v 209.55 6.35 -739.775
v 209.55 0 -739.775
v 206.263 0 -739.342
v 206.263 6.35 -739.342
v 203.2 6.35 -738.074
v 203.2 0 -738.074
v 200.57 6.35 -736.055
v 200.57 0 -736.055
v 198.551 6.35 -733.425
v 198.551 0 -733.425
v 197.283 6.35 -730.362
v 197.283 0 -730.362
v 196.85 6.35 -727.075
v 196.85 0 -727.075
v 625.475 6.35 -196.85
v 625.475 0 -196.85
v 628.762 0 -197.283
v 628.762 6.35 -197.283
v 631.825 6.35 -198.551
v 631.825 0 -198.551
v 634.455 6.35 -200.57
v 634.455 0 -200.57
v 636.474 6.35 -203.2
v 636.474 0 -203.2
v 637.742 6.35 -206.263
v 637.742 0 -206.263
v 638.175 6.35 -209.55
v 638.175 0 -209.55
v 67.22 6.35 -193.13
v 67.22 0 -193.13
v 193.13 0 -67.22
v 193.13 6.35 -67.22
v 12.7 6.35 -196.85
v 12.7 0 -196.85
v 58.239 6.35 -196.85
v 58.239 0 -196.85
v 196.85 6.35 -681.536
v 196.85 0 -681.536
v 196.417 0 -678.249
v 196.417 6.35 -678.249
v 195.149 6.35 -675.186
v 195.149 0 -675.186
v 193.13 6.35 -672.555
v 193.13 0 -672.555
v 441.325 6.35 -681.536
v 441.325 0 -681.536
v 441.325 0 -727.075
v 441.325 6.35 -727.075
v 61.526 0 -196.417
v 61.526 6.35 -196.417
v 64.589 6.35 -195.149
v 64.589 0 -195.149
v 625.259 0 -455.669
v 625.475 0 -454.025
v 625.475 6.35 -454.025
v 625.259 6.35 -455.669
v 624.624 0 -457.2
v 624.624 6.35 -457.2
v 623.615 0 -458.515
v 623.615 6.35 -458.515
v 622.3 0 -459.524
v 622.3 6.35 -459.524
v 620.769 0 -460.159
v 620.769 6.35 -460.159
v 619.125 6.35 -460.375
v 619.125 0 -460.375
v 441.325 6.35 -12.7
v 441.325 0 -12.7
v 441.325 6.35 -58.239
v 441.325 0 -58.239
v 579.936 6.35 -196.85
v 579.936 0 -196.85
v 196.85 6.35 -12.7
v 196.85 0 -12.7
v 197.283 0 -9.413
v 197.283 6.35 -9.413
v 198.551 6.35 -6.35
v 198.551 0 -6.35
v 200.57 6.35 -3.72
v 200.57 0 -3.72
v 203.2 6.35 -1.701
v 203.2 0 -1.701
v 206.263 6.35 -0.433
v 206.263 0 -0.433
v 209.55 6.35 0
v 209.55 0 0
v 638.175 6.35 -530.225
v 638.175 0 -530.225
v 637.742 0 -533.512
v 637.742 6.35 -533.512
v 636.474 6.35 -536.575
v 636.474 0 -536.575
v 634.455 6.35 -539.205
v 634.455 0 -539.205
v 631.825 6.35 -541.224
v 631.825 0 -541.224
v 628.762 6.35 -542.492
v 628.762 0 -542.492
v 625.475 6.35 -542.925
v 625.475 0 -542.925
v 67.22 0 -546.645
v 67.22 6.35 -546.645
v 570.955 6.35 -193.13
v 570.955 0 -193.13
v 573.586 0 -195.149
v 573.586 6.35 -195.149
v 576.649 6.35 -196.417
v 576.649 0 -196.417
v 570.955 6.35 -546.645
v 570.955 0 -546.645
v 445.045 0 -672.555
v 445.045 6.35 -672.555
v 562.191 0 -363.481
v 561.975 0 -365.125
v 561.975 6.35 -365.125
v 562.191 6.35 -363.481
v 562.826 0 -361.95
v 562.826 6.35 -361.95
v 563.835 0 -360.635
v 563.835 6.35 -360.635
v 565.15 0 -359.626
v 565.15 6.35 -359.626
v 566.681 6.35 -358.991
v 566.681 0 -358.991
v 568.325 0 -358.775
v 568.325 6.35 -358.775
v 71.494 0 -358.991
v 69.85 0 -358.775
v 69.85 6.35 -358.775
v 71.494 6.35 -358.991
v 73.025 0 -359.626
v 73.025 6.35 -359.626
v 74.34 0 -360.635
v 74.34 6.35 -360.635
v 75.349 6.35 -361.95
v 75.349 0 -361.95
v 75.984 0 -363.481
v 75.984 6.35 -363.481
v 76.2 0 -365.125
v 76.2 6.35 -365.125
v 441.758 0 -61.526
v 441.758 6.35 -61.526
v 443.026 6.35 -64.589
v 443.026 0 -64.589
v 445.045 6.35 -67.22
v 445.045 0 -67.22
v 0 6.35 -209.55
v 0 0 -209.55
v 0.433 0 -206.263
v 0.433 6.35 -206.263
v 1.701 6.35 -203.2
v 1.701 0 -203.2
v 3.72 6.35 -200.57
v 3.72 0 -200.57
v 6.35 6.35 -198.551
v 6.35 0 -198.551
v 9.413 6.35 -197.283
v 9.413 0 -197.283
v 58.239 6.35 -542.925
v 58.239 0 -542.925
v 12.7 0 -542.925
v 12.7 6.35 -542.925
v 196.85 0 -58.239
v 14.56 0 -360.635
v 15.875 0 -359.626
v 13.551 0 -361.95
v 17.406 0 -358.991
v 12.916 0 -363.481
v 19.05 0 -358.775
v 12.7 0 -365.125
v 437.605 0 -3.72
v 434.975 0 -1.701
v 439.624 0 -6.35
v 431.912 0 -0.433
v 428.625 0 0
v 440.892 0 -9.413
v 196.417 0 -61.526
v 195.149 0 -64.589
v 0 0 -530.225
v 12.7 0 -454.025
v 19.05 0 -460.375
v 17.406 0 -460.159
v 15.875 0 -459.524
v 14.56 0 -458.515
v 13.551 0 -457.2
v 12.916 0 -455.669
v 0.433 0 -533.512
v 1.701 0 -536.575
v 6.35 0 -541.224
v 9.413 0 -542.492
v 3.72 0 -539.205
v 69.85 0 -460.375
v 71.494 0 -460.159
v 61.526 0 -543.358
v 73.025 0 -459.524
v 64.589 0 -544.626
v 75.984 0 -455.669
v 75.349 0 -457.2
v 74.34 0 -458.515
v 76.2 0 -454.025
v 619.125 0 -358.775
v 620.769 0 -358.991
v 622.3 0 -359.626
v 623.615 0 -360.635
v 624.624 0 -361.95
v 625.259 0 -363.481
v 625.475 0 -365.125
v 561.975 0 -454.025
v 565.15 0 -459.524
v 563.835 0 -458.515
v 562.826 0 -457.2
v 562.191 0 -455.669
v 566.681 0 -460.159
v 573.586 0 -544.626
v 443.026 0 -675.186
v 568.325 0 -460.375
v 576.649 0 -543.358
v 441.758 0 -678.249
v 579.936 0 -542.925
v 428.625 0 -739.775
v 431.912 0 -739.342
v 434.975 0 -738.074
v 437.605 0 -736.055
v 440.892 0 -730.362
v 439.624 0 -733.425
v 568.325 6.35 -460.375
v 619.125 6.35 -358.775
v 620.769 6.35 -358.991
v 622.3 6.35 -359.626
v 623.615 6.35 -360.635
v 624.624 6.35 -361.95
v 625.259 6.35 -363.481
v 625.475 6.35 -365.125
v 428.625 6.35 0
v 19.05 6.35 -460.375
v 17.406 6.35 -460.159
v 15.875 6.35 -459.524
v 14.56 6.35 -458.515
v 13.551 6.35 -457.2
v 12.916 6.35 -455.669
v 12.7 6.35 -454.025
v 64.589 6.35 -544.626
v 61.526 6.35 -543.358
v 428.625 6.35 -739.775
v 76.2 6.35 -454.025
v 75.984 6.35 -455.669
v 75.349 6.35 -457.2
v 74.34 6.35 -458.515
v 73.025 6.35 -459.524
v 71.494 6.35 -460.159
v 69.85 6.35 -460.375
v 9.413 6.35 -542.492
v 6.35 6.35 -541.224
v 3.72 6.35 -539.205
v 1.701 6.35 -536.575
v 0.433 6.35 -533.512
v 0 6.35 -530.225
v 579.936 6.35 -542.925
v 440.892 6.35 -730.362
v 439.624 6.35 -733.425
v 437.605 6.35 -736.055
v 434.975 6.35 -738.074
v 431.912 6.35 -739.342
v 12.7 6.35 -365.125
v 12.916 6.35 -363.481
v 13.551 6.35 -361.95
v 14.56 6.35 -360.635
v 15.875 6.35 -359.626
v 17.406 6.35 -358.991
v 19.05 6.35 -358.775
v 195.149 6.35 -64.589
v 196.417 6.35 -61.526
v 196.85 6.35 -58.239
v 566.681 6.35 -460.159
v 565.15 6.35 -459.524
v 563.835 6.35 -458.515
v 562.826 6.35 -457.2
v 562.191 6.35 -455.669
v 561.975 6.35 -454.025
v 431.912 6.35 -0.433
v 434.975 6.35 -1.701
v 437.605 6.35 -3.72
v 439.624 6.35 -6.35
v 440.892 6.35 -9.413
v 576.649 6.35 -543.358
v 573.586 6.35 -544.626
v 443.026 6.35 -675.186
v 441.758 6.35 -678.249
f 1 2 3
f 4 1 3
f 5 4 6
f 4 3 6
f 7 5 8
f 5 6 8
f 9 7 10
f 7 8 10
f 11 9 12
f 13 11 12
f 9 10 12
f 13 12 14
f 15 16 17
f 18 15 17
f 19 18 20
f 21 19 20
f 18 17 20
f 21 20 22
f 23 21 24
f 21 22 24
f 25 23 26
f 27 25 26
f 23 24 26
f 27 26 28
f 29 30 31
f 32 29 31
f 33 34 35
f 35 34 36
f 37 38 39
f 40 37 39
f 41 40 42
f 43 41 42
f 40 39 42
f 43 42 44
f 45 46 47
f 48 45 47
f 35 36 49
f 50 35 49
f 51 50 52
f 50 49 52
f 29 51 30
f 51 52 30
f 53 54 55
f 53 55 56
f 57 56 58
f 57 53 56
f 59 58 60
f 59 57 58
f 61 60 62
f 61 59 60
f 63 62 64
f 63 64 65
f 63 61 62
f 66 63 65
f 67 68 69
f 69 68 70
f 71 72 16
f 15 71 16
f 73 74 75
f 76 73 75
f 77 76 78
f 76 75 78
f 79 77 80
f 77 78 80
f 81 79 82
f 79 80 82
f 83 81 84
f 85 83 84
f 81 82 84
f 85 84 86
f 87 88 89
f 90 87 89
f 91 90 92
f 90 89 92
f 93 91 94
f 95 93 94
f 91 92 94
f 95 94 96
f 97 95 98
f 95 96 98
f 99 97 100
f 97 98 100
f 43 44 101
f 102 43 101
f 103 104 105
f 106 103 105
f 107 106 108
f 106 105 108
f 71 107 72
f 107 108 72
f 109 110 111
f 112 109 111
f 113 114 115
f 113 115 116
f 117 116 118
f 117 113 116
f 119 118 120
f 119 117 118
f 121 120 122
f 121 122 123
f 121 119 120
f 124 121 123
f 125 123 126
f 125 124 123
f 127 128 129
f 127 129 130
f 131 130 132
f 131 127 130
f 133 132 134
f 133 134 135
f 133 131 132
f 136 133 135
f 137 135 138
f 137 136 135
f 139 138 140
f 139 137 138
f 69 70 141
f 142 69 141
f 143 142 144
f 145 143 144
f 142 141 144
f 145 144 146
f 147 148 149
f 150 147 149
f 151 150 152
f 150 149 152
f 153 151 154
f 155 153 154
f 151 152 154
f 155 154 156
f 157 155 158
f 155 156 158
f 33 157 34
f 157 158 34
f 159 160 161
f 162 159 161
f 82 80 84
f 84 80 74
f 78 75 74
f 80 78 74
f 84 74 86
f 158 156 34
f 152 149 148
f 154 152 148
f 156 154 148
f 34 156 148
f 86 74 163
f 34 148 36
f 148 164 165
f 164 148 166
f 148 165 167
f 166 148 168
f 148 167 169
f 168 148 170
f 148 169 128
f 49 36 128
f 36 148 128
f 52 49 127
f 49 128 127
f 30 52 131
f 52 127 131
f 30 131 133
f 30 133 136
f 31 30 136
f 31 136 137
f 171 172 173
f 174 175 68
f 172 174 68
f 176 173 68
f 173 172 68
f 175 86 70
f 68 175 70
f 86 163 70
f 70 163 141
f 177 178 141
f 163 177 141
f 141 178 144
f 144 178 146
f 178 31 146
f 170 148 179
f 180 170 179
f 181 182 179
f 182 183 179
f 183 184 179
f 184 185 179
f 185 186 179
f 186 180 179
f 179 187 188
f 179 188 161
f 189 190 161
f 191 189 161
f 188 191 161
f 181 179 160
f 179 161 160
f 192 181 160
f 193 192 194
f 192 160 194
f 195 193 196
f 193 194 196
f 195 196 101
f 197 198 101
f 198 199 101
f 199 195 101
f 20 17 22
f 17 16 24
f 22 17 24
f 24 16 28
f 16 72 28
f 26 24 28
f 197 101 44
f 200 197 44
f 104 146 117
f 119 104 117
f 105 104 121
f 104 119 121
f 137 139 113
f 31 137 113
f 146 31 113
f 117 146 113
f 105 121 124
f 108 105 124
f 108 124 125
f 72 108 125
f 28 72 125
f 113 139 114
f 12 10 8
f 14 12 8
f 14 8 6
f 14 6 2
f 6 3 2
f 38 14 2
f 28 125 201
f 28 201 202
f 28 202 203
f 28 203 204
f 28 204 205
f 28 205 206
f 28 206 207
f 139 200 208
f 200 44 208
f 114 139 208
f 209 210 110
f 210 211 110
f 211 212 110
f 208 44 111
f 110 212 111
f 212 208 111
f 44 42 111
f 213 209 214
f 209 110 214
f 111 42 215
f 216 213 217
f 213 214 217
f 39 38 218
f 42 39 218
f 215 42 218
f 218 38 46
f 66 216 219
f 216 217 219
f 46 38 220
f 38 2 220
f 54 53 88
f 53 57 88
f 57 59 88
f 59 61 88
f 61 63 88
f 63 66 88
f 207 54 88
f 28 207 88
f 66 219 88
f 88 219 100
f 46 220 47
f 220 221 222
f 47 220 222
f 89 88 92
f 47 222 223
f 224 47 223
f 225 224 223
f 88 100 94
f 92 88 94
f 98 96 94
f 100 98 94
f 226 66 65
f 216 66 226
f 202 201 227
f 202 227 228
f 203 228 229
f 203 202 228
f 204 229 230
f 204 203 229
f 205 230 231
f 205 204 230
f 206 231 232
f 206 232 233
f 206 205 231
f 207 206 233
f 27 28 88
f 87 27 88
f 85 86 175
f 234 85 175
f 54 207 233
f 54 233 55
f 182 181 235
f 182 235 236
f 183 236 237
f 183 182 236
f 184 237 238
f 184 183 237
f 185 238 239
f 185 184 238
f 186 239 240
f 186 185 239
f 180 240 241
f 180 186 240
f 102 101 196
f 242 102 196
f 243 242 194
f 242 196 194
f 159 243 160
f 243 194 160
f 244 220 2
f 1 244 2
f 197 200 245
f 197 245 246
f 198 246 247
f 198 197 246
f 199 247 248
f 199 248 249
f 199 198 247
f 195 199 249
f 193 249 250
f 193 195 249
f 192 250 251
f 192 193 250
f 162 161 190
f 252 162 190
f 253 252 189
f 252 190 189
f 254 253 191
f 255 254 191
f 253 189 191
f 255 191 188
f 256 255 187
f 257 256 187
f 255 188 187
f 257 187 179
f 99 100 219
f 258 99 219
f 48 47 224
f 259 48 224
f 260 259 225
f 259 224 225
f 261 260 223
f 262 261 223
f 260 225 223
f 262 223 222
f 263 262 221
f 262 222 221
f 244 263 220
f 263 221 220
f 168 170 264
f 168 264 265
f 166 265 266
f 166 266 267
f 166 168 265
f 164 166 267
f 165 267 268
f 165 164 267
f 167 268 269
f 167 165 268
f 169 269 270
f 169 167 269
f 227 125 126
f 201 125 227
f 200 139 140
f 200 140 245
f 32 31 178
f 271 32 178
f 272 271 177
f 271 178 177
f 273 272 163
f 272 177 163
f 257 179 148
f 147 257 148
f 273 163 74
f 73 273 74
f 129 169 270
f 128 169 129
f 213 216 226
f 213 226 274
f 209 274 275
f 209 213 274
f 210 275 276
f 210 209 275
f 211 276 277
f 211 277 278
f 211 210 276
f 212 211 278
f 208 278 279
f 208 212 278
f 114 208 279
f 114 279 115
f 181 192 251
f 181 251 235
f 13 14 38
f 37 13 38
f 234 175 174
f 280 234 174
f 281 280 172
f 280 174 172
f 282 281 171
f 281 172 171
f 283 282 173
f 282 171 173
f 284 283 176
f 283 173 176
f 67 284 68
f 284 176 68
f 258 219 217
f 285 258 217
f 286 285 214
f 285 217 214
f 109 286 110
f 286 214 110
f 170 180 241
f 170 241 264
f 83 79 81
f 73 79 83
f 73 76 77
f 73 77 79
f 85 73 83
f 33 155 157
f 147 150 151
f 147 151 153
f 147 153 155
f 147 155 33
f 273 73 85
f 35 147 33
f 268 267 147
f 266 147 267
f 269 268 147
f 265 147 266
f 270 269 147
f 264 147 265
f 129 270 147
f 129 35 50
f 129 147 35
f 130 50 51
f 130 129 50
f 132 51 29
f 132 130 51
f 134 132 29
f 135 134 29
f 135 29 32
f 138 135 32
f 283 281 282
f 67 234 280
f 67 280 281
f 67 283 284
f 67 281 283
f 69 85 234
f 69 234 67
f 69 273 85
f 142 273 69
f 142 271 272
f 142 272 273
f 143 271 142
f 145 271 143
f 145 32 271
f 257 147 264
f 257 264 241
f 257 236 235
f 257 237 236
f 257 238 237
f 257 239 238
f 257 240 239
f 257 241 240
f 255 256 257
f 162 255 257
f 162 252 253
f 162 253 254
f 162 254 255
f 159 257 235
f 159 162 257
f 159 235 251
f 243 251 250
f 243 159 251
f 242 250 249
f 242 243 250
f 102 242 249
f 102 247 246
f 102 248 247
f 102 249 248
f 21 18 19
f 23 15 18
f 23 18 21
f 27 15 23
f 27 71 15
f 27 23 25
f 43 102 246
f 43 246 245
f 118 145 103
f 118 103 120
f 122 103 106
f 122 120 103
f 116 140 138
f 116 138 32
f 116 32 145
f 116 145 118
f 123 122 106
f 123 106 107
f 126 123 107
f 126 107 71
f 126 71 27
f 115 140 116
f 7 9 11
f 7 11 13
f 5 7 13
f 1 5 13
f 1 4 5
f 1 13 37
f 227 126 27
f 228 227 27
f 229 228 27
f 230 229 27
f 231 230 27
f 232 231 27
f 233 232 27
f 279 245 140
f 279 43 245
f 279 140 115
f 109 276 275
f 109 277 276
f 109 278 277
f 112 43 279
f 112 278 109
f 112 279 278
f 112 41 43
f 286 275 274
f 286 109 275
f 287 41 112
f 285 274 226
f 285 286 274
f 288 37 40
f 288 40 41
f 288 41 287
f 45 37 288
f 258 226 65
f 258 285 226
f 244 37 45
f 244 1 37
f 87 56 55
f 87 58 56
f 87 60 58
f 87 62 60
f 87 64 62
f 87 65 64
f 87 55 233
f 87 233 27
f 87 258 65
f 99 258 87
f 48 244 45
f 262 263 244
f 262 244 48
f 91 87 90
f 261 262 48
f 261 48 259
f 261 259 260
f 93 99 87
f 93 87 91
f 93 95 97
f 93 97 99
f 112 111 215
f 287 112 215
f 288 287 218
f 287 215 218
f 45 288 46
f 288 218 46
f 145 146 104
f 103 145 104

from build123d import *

# Parameters (mm, degrees)
BOSS_EXTRUDE1_DEPTH = 6.35


with BuildPart() as part:
    # Sketch1 → Boss-Extrude1 (new body)
    with BuildSketch(Plane(origin=(0, 0, 0), x_dir=(1, 0, 0), z_dir=(0, 1, 0))):
        with BuildLine():
            Line((209.55, 0), (428.625, 0))
            ThreePointArc((428.625, 0), (437.605256121, 3.719743879), (441.325, 12.7))
            Line((441.325, 12.7), (441.325, 58.239487758))
            ThreePointArc((441.325, 58.239487758), (442.291729937, 63.099567349), (445.044743879, 67.219743879))
            Line((445.044743879, 67.219743879), (570.955256121, 193.130256121))
            ThreePointArc((570.955256121, 193.130256121), (575.075432651, 195.883270063), (579.935512242, 196.85))
            Line((579.935512242, 196.85), (625.475, 196.85))
            ThreePointArc((625.475, 196.85), (634.455256121, 200.569743879), (638.175, 209.55))
            Line((638.175, 209.55), (638.175, 358.775))
            Line((638.175, 358.775), (638.175, 460.375))
            Line((638.175, 460.375), (638.175, 530.225))
            ThreePointArc((638.175, 530.225), (634.455256121, 539.205256121), (625.475, 542.925))
            Line((625.475, 542.925), (579.935512242, 542.925))
            ThreePointArc((579.935512242, 542.925), (575.075432651, 543.891729937), (570.955256121, 546.644743879))
            Line((570.955256121, 546.644743879), (445.044743879, 672.555256121))
            ThreePointArc((445.044743879, 672.555256121), (442.291729937, 676.675432651), (441.325, 681.535512242))
            Line((441.325, 681.535512242), (441.325, 727.075))
            ThreePointArc((441.325, 727.075), (437.605256121, 736.055256121), (428.625, 739.775))
            Line((428.625, 739.775), (209.55, 739.775))
            ThreePointArc((209.55, 739.775), (200.569743879, 736.055256121), (196.85, 727.075))
            Line((196.85, 727.075), (196.85, 681.535512242))
            ThreePointArc((196.85, 681.535512242), (195.883270063, 676.675432651), (193.130256121, 672.555256121))
            Line((193.130256121, 672.555256121), (67.219743879, 546.644743879))
            ThreePointArc((67.219743879, 546.644743879), (63.099567349, 543.891729937), (58.239487758, 542.925))
            Line((58.239487758, 542.925), (12.7, 542.925))
            ThreePointArc((12.7, 542.925), (3.719743879, 539.205256121), (0, 530.225))
            Line((0, 530.225), (0, 209.55))
            ThreePointArc((0, 209.55), (3.719743879, 200.569743879), (12.7, 196.85))
            Line((12.7, 196.85), (58.239487758, 196.85))
            ThreePointArc((58.239487758, 196.85), (63.099567349, 195.883270063), (67.219743879, 193.130256121))
            Line((67.219743879, 193.130256121), (193.130256121, 67.219743879))
            ThreePointArc((193.130256121, 67.219743879), (195.883270063, 63.099567349), (196.85, 58.239487758))
            Line((196.85, 58.239487758), (196.85, 12.7))
            ThreePointArc((196.85, 12.7), (200.569743879, 3.719743879), (209.55, 0))
        make_face()
        with BuildLine():
            Line((619.125, 460.375), (568.325, 460.375))
            ThreePointArc((568.325, 460.375), (563.834871939, 458.515128061), (561.975, 454.025))
            Line((561.975, 454.025), (561.975, 365.125))
            ThreePointArc((561.975, 365.125), (563.834871939, 360.634871939), (568.325, 358.775))
            Line((568.325, 358.775), (619.125, 358.775))
            ThreePointArc((619.125, 358.775), (623.615128061, 360.634871939), (625.475, 365.125))
            Line((625.475, 365.125), (625.475, 454.025))
            ThreePointArc((625.475, 454.025), (623.615128061, 458.515128061), (619.125, 460.375))
        make_face(mode=Mode.SUBTRACT)
        with BuildLine():
            Line((12.7, 454.025), (12.7, 365.125))
            ThreePointArc((12.7, 365.125), (14.559871939, 360.634871939), (19.05, 358.775))
            Line((19.05, 358.775), (69.85, 358.775))
            ThreePointArc((69.85, 358.775), (74.340128061, 360.634871939), (76.2, 365.125))
            Line((76.2, 365.125), (76.2, 454.025))
            ThreePointArc((76.2, 454.025), (74.340128061, 458.515128061), (69.85, 460.375))
            Line((69.85, 460.375), (19.05, 460.375))
            ThreePointArc((19.05, 460.375), (14.559871939, 458.515128061), (12.7, 454.025))
        make_face(mode=Mode.SUBTRACT)
    extrude(amount=BOSS_EXTRUDE1_DEPTH)


solid = part.part
